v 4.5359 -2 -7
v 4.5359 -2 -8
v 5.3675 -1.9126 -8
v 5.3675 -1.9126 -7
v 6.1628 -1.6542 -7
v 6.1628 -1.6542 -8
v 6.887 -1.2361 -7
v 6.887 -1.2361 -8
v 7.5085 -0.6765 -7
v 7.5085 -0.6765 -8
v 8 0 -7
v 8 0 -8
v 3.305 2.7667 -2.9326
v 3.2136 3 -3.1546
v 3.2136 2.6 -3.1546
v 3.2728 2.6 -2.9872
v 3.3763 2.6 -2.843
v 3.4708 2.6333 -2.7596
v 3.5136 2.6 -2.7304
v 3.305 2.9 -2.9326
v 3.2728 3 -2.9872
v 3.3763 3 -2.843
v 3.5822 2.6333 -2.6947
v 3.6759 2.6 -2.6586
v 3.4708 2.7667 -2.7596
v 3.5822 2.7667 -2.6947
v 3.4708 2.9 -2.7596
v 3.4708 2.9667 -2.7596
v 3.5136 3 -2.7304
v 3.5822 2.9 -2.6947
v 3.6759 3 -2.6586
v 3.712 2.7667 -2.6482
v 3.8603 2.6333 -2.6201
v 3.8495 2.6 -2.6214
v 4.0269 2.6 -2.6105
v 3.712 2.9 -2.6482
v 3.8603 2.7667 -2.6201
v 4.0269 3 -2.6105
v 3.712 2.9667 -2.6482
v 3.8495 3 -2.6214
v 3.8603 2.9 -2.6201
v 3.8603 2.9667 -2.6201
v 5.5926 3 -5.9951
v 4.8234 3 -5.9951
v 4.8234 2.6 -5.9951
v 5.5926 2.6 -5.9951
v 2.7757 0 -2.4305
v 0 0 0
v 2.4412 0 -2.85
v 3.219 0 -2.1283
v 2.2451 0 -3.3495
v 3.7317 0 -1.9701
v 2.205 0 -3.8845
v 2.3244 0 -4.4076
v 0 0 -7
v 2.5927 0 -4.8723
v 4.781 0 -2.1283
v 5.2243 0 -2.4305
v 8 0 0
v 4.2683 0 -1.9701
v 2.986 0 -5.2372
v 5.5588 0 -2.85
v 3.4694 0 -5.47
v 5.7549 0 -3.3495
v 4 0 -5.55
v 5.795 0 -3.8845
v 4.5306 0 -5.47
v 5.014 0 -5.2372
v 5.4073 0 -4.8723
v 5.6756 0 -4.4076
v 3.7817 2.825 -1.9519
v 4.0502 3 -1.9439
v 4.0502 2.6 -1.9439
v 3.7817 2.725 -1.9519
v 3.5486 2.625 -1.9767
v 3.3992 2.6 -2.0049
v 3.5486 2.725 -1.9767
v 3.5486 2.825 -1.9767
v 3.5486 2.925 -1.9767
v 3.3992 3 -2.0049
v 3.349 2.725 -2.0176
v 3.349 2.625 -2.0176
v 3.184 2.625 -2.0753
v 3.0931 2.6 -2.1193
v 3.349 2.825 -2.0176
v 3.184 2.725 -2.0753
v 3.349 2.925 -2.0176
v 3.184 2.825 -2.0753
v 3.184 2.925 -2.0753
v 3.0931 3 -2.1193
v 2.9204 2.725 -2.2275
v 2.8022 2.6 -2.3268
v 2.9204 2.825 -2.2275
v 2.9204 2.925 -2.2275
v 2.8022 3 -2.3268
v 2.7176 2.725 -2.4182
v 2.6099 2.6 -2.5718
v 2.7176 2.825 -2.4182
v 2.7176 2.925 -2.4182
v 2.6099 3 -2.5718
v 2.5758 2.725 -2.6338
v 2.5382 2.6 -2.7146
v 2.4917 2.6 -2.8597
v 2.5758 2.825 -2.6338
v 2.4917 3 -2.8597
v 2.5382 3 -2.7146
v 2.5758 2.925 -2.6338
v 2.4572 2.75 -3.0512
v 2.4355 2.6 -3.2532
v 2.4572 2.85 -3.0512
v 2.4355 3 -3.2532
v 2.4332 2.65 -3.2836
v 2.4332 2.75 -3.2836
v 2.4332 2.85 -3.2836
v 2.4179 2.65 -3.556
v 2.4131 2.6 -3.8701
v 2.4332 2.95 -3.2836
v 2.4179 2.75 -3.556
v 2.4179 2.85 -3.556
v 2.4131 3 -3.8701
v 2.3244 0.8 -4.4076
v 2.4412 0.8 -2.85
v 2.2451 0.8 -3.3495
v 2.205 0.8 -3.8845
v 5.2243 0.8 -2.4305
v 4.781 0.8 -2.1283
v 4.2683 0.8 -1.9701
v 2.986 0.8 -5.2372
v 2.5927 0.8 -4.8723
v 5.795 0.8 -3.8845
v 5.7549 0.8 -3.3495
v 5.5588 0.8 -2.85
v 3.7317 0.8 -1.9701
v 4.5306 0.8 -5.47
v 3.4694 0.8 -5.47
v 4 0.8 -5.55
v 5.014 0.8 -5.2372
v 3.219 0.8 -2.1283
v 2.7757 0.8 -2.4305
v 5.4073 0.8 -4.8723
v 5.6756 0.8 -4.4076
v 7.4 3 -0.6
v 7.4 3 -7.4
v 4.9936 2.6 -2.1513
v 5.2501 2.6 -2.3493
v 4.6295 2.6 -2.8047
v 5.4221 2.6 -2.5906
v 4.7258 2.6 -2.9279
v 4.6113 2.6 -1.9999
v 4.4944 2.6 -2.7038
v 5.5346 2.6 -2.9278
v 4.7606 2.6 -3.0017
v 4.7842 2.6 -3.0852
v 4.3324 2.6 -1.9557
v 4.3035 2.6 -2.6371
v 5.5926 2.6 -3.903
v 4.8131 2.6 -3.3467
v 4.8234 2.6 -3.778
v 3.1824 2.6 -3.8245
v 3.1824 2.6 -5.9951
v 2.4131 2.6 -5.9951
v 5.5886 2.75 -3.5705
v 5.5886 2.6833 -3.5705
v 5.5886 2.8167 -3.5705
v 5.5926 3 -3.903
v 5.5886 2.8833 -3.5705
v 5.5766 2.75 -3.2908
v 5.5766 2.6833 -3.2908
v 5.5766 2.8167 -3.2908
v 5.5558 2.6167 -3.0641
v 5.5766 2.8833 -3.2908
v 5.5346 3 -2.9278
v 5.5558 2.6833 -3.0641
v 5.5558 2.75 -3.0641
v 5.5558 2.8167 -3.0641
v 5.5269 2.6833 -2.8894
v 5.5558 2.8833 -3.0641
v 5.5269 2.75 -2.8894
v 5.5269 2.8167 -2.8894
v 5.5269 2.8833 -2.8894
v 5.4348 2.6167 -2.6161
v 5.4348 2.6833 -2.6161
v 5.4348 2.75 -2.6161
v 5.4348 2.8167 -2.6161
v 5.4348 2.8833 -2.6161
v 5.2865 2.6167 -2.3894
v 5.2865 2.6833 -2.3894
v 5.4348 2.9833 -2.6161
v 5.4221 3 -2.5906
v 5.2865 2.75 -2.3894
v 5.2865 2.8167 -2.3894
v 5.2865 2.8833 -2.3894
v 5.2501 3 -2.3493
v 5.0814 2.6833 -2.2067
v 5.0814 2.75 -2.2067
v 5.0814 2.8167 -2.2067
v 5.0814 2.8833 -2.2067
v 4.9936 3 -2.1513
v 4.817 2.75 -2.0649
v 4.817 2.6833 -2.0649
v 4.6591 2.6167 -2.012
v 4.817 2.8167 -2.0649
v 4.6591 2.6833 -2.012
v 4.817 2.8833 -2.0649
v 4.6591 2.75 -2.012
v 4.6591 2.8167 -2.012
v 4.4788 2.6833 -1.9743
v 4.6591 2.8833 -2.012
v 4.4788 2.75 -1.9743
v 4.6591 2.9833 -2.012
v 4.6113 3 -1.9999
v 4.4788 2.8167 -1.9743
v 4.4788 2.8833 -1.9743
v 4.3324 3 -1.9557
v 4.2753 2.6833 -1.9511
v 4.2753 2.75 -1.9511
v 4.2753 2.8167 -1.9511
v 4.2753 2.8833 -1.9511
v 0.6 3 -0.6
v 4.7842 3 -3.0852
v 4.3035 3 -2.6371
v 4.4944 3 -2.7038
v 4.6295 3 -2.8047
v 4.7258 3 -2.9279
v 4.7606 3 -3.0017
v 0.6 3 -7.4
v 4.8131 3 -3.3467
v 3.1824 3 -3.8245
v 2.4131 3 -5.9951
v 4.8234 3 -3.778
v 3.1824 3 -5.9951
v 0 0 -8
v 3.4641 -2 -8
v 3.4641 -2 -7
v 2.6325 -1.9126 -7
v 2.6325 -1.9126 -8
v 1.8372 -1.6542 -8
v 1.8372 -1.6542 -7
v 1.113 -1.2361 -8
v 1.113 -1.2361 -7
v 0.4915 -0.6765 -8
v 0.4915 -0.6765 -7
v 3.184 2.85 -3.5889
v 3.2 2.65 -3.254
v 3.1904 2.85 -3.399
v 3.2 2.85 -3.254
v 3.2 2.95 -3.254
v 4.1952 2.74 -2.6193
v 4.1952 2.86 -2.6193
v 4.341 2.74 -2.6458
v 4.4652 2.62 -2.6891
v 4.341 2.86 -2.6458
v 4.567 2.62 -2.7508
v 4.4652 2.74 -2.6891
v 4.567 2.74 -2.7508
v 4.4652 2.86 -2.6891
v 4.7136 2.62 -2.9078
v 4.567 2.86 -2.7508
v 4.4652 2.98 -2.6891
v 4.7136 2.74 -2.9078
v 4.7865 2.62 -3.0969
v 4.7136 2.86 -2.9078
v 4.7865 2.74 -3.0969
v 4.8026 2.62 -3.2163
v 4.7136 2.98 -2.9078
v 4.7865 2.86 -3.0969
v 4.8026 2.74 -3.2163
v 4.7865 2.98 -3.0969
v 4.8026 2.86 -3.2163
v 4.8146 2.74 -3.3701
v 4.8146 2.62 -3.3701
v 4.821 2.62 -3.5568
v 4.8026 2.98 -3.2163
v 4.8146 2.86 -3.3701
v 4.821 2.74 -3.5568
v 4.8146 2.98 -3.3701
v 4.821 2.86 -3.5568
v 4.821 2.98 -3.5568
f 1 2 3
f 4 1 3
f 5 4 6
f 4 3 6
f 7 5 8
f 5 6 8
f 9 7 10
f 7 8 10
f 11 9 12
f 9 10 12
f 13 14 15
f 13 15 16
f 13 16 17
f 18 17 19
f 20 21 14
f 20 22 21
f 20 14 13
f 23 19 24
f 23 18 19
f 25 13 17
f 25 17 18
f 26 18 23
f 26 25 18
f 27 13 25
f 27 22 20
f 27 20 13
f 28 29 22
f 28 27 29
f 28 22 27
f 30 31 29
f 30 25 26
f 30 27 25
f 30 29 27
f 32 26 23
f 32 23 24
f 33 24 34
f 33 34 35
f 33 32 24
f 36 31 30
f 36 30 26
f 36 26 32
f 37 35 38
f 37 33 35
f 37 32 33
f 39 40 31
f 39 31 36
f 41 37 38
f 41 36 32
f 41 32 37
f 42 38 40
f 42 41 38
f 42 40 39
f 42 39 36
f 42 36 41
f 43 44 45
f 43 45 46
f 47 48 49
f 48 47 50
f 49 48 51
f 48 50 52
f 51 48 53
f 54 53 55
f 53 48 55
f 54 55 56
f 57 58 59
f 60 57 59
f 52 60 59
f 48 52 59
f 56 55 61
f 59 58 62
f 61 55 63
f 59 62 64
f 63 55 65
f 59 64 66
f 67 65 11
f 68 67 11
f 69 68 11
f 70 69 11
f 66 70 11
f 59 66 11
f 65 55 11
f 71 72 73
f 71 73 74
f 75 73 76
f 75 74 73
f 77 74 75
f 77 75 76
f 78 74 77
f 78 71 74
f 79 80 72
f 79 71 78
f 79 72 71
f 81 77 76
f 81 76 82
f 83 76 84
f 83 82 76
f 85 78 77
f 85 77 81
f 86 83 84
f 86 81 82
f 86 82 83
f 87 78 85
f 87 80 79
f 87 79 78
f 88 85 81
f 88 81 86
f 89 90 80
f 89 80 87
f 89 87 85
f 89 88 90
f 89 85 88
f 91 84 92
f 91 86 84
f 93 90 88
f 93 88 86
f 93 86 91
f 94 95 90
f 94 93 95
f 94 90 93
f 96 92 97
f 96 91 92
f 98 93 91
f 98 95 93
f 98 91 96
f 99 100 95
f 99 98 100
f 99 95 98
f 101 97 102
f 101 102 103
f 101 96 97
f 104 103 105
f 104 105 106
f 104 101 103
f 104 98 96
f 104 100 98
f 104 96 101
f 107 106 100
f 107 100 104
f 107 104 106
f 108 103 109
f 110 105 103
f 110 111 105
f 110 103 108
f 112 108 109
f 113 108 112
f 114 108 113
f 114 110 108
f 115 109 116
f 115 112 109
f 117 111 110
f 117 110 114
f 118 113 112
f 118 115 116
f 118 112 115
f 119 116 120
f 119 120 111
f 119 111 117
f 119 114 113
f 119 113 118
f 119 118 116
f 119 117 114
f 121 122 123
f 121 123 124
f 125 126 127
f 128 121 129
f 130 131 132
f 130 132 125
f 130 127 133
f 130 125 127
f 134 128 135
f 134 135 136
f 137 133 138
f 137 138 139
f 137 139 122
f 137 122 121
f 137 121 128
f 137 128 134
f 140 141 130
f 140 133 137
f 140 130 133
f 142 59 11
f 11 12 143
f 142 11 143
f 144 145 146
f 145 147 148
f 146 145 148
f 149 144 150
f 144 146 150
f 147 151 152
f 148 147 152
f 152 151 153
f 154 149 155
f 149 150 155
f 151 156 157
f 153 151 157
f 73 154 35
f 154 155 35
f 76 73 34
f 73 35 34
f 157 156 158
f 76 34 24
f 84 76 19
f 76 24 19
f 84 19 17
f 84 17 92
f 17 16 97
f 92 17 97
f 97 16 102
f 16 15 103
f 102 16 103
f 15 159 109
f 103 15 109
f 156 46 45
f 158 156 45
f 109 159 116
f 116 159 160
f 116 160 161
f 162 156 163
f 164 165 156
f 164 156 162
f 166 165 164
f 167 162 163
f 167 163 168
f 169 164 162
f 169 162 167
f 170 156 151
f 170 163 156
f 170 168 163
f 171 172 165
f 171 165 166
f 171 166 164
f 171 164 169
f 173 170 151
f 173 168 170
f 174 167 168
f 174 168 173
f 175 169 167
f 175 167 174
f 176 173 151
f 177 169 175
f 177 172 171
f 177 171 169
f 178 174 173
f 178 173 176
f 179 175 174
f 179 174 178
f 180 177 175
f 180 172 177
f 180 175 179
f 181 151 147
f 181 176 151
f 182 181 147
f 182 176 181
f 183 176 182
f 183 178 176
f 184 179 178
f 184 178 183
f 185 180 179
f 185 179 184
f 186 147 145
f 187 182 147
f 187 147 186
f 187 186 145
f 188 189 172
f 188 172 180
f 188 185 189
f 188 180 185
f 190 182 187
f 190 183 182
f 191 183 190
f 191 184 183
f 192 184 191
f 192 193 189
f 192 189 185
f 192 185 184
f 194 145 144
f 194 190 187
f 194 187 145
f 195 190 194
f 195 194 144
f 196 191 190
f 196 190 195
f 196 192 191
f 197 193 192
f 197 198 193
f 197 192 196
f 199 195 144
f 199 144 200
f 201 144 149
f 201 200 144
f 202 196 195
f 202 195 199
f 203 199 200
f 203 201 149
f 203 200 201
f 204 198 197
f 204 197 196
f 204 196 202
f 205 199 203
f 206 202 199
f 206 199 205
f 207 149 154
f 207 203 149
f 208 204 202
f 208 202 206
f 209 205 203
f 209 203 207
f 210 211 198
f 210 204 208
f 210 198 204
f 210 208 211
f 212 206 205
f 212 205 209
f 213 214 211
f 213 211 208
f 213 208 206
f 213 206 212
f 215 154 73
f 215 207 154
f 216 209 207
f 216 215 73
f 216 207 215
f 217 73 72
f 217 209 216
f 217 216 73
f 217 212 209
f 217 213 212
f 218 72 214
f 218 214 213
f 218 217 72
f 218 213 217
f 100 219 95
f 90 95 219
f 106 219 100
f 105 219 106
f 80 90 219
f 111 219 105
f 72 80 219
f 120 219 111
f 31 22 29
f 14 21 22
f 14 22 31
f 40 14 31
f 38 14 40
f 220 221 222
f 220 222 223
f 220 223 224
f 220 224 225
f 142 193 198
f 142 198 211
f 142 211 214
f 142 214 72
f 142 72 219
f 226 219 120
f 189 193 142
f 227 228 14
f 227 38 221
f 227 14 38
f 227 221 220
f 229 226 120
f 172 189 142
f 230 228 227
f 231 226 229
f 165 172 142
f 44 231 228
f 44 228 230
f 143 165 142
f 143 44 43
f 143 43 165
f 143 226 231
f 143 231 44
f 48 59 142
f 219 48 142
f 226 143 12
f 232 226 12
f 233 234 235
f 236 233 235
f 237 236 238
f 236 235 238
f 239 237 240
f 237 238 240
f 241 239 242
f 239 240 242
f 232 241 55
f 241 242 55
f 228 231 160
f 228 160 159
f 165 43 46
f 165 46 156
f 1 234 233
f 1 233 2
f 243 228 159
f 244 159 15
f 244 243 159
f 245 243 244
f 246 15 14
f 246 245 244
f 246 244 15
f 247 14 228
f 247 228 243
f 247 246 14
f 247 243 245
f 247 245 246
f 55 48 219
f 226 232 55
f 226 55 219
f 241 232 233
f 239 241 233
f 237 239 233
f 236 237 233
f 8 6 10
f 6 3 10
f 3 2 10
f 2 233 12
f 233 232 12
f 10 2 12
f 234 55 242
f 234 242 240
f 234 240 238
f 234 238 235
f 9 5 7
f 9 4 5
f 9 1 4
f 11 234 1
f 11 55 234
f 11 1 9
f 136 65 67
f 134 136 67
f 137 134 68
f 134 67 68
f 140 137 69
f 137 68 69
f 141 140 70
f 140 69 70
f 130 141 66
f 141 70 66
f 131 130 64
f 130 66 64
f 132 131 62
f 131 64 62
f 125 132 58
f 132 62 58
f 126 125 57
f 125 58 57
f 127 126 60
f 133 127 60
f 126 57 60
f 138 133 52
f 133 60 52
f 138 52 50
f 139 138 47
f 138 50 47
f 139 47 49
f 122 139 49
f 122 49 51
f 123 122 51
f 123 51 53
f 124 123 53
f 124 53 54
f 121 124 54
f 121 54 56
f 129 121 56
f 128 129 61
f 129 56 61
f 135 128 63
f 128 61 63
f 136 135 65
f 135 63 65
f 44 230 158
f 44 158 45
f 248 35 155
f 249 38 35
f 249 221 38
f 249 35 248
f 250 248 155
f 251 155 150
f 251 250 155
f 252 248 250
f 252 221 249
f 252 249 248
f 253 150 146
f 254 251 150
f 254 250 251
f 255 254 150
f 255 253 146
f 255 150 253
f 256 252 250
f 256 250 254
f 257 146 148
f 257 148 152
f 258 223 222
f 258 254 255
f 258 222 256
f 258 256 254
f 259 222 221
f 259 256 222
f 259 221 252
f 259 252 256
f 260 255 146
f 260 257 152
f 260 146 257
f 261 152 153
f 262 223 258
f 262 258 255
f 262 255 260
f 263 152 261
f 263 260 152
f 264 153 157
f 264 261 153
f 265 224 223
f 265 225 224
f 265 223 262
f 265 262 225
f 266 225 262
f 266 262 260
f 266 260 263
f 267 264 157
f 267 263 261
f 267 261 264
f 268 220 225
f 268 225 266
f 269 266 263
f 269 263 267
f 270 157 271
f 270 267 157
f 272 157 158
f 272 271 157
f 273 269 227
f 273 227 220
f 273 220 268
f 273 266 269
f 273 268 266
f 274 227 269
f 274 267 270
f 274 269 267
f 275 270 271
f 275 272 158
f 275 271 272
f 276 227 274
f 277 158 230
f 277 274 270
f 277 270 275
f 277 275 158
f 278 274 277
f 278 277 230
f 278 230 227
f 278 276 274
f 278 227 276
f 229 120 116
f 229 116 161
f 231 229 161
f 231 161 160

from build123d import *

# Parameters (mm, degrees)
SKETCH1_W               = 8
SKETCH1_H               = 8
BOSS_EXTRUDE1_DEPTH     = 3
CUT_EXTRUDE1_DEPTH      = 12.704699911
CUT_EXTRUDE1_DEPTH_BACK = 12.704699911
CUT_EXTRUDE2_DEPTH      = 11
SKETCH4_R               = 1.8
CUT_EXTRUDE3_DEPTH      = 0.8
SKETCH5_W               = 8
SKETCH5_H               = 1
BOSS_EXTRUDE2_DEPTH     = 2
FILLET1_R               = 4
CUT_EXTRUDE4_DEPTH      = 0.4


with BuildPart() as part:
    # Sketch1 → Boss-Extrude1 (new body)
    with BuildSketch(Plane(origin=(0, 0, 0), x_dir=(1, 0, 0), z_dir=(0, 1, 0))):
        with Locations((4, 4)):
            Rectangle(SKETCH1_W, SKETCH1_H)
    extrude(amount=BOSS_EXTRUDE1_DEPTH)

    # Sketch2 → Cut-Extrude1 (cut, two sides: drawn at the far end of the back side and taken through both)
    with BuildSketch(Plane.XY.offset(-CUT_EXTRUDE1_DEPTH_BACK)):
        Polygon((0, 0), (0.6, 3), (0, 3), align=None)
        Polygon((8, 0), (7.4, 3), (8, 3), align=None)
    extrude(amount=CUT_EXTRUDE1_DEPTH + CUT_EXTRUDE1_DEPTH_BACK, mode=Mode.SUBTRACT)

    # Sketch3 → Cut-Extrude2 (cut)
    with BuildSketch(Plane(origin=(0, 0, 0), x_dir=(0, 0, -1), z_dir=(1, 0, 0))):
        Polygon((0, 0), (0.6, 3), (0, 3), align=None)
        Polygon((8, 3), (7.4, 3), (8, 0), align=None)
    extrude(amount=CUT_EXTRUDE2_DEPTH, mode=Mode.SUBTRACT)

    # Sketch4 → Cut-Extrude3 (cut)
    with BuildSketch(Plane.XZ):
        with Locations(Location((4, -3.75, 0), (0, 0, 270))):
            Circle(SKETCH4_R)
    extrude(amount=-CUT_EXTRUDE3_DEPTH, mode=Mode.SUBTRACT)

    # Sketch5 → Boss-Extrude2 (add)
    with BuildSketch(Plane.XZ):
        with Locations((4, -7.5)):
            Rectangle(SKETCH5_W, SKETCH5_H)
    extrude(amount=BOSS_EXTRUDE2_DEPTH)

    # Fillet1
    # the kernel refuses this fillet: 4 mm, written as the material it takes off along each edge
    with BuildSketch(Plane(origin=(8, -2, -16.660254038), x_dir=(0, 1, 0), z_dir=(0, 0, 1)), Plane(origin=(0, -2, 1.660254038), x_dir=(0, 1, 0), z_dir=(0, 0, -1))) as fillet1_piece_1:
        with BuildLine():
            CenterArc((4, 3.464101615), FILLET1_R, 180, 60)
            Line((0, 3.464101615), (-0.08, 3.464101615))
            Line((-0.08, 3.464101615), (-0.08, 0))
            Line((-0.08, 0), (0, -0.08))
            ThreePointArc((0, -0.08), (1, -0.08), (1.96, -0.069282032))
            Line((1.96, -0.069282032), (2, 0))
        make_face()
    extrude(amount=18.320508076, mode=Mode.SUBTRACT)

    # Sketch6 → Cut-Extrude4 (cut)
    with BuildSketch(Plane(origin=(0, 3, 0), x_dir=(1, 0, 0), z_dir=(0, 1, 0))):
        with BuildLine():
            Line((2.413140262, 5.995145478), (3.182371031, 5.995145478))
            Line((3.182371031, 5.995145478), (3.182371031, 3.824472401))
            add(Edge.make_bspline(
                [(3.182371031, 3.824472401), (3.182664695, 3.783339968), (3.183225327, 3.704814249), (3.183611242, 3.59262518), (3.18574694, 3.491896749), (3.190378411, 3.402466647), (3.193557117, 3.32438048), (3.199459629, 3.257623918), (3.205347836, 3.202222959), (3.211072588, 3.16927001), (3.213621031, 3.154600607)],
                knots=[0, 0, 0, 0, 1.470600056, 2.807515117, 4.011048972, 5.072079398, 6.00911328, 6.804506435, 7.467811572, 8, 8, 8, 8], degree=3))
            add(Edge.make_bspline(
                [(3.213621031, 3.154600607), (3.224127628, 3.115054038), (3.244816443, 3.03718185), (3.301842427, 2.930732637), (3.377172946, 2.83690436), (3.454012852, 2.769989694), (3.523520467, 2.722632459), (3.582561491, 2.693810163), (3.645203631, 2.667536787), (3.712771176, 2.647377448), (3.784538951, 2.629737301), (3.861373833, 2.619537644), (3.942627383, 2.611709661), (3.998321517, 2.610930314), (4.026922313, 2.610530094)],
                knots=[0, 0, 0, 0, 1.376921055, 2.711331395, 4.038631339, 5.418057255, 6.132954575, 6.870556231, 7.630397752, 8.422890386, 9.247036838, 10.121396817, 11.035274583, 12, 12, 12, 12], degree=3))
            add(Edge.make_bspline(
                [(4.026922313, 2.610530094), (4.055777389, 2.611053435), (4.111957634, 2.612072369), (4.193372399, 2.618140476), (4.269330983, 2.629588903), (4.339786919, 2.644600001), (4.40511233, 2.663571514), (4.464786061, 2.687591678), (4.518714075, 2.716497769), (4.582078678, 2.760066391), (4.650258908, 2.821527538), (4.715873674, 2.905091818), (4.762833649, 2.997337694), (4.784859868, 3.081565077), (4.796180605, 3.154949811), (4.803077806, 3.219164001), (4.809385646, 3.291832182), (4.815113647, 3.372755319), (4.819030865, 3.461994153), (4.821149619, 3.559774375), (4.82281709, 3.666080391), (4.823198873, 3.739802878), (4.823396672, 3.777998042)],
                knots=[0, 0, 0, 0, 1.036876239, 2.018776863, 2.930845756, 3.794842666, 4.605604932, 5.371924355, 6.101864688, 6.799283669, 8.1310906, 9.382718023, 10.597336334, 11.822035891, 12.492591141, 13.265194674, 14.141890321, 15.11351293, 16.179860579, 17.351049011, 18.627594861, 20, 20, 20, 20], degree=3))
            Line((4.823396672, 3.777998042), (4.823396672, 5.995145478))
            Line((4.823396672, 5.995145478), (5.592627441, 5.995145478))
            Line((5.592627441, 5.995145478), (5.592627441, 3.902998042))
            add(Edge.make_bspline(
                [(5.592627441, 3.902998042), (5.592528847, 3.845305157), (5.592339402, 3.734449864), (5.589381475, 3.574956755), (5.583094941, 3.428628514), (5.577830511, 3.295214312), (5.567675642, 3.175054503), (5.557043529, 3.068074376), (5.543346947, 2.974292627), (5.523815493, 2.867696041), (5.490991615, 2.748101531), (5.438090809, 2.615994056), (5.370481989, 2.495804532), (5.288434562, 2.387071806), (5.192421188, 2.289363714), (5.081004269, 2.203064381), (4.955329501, 2.127124651), (4.84016309, 2.072443299), (4.739752735, 2.035622669), (4.65797018, 2.010704116), (4.570444093, 1.989952175), (4.477277128, 1.973483664), (4.378429252, 1.959598273), (4.273864574, 1.950325107), (4.163741291, 1.944537997), (4.088628699, 1.944091898), (4.050159493, 1.943863427)],
                knots=[0, 0, 0, 0, 1.415574045, 2.719986624, 3.913607924, 5.00929969, 5.995467356, 6.871900228, 7.64671288, 8.320227872, 9.530145585, 10.682614022, 11.803571353, 12.90325401, 14.015460715, 15.154679255, 16.351678057, 17.612271512, 18.275764165, 18.974412946, 19.708786676, 20.481351116, 21.295095879, 22.157200529, 23.056203067, 24, 24, 24, 24], degree=3))
            add(Edge.make_bspline(
                [(4.050159493, 1.943863427), (4.00394899, 1.944454117), (3.914432357, 1.945598373), (3.784491522, 1.950702797), (3.663419731, 1.961238523), (3.550836598, 1.975478544), (3.446788608, 1.993784557), (3.351012543, 2.015669281), (3.264273035, 2.043328483), (3.160959321, 2.082832512), (3.045798952, 2.143260432), (2.920442018, 2.223870786), (2.810400187, 2.314853884), (2.716640343, 2.415320705), (2.638260762, 2.521740618), (2.574552012, 2.631810814), (2.523497916, 2.743696672), (2.502164616, 2.821459533), (2.491665903, 2.859728812)],
                knots=[0, 0, 0, 0, 1.128613534, 2.186292659, 3.174878439, 4.095586888, 4.95671962, 5.754129884, 6.492676435, 7.178284149, 8.453103036, 9.659838108, 10.813193309, 11.929983019, 13.007587775, 14.033493319, 15.032227051, 16, 16, 16, 16], degree=3))
            add(Edge.make_bspline(
                [(2.491665903, 2.859728812), (2.48524032, 2.889857793), (2.471705989, 2.953319061), (2.456334745, 3.054210037), (2.442311642, 3.165307899), (2.432733679, 3.286744058), (2.423654648, 3.418133217), (2.417136225, 3.559723113), (2.414455843, 3.711481594), (2.413587623, 3.816192051), (2.413140262, 3.870145478)],
                knots=[0, 0, 0, 0, 0.728071598, 1.533551606, 2.411422299, 3.374601532, 4.412367648, 5.524718474, 6.72457895, 8, 8, 8, 8], degree=3))
            Line((2.413140262, 3.870145478), (2.413140262, 5.995145478))
        make_face()
    extrude(amount=-CUT_EXTRUDE4_DEPTH, mode=Mode.SUBTRACT)


solid = part.part
